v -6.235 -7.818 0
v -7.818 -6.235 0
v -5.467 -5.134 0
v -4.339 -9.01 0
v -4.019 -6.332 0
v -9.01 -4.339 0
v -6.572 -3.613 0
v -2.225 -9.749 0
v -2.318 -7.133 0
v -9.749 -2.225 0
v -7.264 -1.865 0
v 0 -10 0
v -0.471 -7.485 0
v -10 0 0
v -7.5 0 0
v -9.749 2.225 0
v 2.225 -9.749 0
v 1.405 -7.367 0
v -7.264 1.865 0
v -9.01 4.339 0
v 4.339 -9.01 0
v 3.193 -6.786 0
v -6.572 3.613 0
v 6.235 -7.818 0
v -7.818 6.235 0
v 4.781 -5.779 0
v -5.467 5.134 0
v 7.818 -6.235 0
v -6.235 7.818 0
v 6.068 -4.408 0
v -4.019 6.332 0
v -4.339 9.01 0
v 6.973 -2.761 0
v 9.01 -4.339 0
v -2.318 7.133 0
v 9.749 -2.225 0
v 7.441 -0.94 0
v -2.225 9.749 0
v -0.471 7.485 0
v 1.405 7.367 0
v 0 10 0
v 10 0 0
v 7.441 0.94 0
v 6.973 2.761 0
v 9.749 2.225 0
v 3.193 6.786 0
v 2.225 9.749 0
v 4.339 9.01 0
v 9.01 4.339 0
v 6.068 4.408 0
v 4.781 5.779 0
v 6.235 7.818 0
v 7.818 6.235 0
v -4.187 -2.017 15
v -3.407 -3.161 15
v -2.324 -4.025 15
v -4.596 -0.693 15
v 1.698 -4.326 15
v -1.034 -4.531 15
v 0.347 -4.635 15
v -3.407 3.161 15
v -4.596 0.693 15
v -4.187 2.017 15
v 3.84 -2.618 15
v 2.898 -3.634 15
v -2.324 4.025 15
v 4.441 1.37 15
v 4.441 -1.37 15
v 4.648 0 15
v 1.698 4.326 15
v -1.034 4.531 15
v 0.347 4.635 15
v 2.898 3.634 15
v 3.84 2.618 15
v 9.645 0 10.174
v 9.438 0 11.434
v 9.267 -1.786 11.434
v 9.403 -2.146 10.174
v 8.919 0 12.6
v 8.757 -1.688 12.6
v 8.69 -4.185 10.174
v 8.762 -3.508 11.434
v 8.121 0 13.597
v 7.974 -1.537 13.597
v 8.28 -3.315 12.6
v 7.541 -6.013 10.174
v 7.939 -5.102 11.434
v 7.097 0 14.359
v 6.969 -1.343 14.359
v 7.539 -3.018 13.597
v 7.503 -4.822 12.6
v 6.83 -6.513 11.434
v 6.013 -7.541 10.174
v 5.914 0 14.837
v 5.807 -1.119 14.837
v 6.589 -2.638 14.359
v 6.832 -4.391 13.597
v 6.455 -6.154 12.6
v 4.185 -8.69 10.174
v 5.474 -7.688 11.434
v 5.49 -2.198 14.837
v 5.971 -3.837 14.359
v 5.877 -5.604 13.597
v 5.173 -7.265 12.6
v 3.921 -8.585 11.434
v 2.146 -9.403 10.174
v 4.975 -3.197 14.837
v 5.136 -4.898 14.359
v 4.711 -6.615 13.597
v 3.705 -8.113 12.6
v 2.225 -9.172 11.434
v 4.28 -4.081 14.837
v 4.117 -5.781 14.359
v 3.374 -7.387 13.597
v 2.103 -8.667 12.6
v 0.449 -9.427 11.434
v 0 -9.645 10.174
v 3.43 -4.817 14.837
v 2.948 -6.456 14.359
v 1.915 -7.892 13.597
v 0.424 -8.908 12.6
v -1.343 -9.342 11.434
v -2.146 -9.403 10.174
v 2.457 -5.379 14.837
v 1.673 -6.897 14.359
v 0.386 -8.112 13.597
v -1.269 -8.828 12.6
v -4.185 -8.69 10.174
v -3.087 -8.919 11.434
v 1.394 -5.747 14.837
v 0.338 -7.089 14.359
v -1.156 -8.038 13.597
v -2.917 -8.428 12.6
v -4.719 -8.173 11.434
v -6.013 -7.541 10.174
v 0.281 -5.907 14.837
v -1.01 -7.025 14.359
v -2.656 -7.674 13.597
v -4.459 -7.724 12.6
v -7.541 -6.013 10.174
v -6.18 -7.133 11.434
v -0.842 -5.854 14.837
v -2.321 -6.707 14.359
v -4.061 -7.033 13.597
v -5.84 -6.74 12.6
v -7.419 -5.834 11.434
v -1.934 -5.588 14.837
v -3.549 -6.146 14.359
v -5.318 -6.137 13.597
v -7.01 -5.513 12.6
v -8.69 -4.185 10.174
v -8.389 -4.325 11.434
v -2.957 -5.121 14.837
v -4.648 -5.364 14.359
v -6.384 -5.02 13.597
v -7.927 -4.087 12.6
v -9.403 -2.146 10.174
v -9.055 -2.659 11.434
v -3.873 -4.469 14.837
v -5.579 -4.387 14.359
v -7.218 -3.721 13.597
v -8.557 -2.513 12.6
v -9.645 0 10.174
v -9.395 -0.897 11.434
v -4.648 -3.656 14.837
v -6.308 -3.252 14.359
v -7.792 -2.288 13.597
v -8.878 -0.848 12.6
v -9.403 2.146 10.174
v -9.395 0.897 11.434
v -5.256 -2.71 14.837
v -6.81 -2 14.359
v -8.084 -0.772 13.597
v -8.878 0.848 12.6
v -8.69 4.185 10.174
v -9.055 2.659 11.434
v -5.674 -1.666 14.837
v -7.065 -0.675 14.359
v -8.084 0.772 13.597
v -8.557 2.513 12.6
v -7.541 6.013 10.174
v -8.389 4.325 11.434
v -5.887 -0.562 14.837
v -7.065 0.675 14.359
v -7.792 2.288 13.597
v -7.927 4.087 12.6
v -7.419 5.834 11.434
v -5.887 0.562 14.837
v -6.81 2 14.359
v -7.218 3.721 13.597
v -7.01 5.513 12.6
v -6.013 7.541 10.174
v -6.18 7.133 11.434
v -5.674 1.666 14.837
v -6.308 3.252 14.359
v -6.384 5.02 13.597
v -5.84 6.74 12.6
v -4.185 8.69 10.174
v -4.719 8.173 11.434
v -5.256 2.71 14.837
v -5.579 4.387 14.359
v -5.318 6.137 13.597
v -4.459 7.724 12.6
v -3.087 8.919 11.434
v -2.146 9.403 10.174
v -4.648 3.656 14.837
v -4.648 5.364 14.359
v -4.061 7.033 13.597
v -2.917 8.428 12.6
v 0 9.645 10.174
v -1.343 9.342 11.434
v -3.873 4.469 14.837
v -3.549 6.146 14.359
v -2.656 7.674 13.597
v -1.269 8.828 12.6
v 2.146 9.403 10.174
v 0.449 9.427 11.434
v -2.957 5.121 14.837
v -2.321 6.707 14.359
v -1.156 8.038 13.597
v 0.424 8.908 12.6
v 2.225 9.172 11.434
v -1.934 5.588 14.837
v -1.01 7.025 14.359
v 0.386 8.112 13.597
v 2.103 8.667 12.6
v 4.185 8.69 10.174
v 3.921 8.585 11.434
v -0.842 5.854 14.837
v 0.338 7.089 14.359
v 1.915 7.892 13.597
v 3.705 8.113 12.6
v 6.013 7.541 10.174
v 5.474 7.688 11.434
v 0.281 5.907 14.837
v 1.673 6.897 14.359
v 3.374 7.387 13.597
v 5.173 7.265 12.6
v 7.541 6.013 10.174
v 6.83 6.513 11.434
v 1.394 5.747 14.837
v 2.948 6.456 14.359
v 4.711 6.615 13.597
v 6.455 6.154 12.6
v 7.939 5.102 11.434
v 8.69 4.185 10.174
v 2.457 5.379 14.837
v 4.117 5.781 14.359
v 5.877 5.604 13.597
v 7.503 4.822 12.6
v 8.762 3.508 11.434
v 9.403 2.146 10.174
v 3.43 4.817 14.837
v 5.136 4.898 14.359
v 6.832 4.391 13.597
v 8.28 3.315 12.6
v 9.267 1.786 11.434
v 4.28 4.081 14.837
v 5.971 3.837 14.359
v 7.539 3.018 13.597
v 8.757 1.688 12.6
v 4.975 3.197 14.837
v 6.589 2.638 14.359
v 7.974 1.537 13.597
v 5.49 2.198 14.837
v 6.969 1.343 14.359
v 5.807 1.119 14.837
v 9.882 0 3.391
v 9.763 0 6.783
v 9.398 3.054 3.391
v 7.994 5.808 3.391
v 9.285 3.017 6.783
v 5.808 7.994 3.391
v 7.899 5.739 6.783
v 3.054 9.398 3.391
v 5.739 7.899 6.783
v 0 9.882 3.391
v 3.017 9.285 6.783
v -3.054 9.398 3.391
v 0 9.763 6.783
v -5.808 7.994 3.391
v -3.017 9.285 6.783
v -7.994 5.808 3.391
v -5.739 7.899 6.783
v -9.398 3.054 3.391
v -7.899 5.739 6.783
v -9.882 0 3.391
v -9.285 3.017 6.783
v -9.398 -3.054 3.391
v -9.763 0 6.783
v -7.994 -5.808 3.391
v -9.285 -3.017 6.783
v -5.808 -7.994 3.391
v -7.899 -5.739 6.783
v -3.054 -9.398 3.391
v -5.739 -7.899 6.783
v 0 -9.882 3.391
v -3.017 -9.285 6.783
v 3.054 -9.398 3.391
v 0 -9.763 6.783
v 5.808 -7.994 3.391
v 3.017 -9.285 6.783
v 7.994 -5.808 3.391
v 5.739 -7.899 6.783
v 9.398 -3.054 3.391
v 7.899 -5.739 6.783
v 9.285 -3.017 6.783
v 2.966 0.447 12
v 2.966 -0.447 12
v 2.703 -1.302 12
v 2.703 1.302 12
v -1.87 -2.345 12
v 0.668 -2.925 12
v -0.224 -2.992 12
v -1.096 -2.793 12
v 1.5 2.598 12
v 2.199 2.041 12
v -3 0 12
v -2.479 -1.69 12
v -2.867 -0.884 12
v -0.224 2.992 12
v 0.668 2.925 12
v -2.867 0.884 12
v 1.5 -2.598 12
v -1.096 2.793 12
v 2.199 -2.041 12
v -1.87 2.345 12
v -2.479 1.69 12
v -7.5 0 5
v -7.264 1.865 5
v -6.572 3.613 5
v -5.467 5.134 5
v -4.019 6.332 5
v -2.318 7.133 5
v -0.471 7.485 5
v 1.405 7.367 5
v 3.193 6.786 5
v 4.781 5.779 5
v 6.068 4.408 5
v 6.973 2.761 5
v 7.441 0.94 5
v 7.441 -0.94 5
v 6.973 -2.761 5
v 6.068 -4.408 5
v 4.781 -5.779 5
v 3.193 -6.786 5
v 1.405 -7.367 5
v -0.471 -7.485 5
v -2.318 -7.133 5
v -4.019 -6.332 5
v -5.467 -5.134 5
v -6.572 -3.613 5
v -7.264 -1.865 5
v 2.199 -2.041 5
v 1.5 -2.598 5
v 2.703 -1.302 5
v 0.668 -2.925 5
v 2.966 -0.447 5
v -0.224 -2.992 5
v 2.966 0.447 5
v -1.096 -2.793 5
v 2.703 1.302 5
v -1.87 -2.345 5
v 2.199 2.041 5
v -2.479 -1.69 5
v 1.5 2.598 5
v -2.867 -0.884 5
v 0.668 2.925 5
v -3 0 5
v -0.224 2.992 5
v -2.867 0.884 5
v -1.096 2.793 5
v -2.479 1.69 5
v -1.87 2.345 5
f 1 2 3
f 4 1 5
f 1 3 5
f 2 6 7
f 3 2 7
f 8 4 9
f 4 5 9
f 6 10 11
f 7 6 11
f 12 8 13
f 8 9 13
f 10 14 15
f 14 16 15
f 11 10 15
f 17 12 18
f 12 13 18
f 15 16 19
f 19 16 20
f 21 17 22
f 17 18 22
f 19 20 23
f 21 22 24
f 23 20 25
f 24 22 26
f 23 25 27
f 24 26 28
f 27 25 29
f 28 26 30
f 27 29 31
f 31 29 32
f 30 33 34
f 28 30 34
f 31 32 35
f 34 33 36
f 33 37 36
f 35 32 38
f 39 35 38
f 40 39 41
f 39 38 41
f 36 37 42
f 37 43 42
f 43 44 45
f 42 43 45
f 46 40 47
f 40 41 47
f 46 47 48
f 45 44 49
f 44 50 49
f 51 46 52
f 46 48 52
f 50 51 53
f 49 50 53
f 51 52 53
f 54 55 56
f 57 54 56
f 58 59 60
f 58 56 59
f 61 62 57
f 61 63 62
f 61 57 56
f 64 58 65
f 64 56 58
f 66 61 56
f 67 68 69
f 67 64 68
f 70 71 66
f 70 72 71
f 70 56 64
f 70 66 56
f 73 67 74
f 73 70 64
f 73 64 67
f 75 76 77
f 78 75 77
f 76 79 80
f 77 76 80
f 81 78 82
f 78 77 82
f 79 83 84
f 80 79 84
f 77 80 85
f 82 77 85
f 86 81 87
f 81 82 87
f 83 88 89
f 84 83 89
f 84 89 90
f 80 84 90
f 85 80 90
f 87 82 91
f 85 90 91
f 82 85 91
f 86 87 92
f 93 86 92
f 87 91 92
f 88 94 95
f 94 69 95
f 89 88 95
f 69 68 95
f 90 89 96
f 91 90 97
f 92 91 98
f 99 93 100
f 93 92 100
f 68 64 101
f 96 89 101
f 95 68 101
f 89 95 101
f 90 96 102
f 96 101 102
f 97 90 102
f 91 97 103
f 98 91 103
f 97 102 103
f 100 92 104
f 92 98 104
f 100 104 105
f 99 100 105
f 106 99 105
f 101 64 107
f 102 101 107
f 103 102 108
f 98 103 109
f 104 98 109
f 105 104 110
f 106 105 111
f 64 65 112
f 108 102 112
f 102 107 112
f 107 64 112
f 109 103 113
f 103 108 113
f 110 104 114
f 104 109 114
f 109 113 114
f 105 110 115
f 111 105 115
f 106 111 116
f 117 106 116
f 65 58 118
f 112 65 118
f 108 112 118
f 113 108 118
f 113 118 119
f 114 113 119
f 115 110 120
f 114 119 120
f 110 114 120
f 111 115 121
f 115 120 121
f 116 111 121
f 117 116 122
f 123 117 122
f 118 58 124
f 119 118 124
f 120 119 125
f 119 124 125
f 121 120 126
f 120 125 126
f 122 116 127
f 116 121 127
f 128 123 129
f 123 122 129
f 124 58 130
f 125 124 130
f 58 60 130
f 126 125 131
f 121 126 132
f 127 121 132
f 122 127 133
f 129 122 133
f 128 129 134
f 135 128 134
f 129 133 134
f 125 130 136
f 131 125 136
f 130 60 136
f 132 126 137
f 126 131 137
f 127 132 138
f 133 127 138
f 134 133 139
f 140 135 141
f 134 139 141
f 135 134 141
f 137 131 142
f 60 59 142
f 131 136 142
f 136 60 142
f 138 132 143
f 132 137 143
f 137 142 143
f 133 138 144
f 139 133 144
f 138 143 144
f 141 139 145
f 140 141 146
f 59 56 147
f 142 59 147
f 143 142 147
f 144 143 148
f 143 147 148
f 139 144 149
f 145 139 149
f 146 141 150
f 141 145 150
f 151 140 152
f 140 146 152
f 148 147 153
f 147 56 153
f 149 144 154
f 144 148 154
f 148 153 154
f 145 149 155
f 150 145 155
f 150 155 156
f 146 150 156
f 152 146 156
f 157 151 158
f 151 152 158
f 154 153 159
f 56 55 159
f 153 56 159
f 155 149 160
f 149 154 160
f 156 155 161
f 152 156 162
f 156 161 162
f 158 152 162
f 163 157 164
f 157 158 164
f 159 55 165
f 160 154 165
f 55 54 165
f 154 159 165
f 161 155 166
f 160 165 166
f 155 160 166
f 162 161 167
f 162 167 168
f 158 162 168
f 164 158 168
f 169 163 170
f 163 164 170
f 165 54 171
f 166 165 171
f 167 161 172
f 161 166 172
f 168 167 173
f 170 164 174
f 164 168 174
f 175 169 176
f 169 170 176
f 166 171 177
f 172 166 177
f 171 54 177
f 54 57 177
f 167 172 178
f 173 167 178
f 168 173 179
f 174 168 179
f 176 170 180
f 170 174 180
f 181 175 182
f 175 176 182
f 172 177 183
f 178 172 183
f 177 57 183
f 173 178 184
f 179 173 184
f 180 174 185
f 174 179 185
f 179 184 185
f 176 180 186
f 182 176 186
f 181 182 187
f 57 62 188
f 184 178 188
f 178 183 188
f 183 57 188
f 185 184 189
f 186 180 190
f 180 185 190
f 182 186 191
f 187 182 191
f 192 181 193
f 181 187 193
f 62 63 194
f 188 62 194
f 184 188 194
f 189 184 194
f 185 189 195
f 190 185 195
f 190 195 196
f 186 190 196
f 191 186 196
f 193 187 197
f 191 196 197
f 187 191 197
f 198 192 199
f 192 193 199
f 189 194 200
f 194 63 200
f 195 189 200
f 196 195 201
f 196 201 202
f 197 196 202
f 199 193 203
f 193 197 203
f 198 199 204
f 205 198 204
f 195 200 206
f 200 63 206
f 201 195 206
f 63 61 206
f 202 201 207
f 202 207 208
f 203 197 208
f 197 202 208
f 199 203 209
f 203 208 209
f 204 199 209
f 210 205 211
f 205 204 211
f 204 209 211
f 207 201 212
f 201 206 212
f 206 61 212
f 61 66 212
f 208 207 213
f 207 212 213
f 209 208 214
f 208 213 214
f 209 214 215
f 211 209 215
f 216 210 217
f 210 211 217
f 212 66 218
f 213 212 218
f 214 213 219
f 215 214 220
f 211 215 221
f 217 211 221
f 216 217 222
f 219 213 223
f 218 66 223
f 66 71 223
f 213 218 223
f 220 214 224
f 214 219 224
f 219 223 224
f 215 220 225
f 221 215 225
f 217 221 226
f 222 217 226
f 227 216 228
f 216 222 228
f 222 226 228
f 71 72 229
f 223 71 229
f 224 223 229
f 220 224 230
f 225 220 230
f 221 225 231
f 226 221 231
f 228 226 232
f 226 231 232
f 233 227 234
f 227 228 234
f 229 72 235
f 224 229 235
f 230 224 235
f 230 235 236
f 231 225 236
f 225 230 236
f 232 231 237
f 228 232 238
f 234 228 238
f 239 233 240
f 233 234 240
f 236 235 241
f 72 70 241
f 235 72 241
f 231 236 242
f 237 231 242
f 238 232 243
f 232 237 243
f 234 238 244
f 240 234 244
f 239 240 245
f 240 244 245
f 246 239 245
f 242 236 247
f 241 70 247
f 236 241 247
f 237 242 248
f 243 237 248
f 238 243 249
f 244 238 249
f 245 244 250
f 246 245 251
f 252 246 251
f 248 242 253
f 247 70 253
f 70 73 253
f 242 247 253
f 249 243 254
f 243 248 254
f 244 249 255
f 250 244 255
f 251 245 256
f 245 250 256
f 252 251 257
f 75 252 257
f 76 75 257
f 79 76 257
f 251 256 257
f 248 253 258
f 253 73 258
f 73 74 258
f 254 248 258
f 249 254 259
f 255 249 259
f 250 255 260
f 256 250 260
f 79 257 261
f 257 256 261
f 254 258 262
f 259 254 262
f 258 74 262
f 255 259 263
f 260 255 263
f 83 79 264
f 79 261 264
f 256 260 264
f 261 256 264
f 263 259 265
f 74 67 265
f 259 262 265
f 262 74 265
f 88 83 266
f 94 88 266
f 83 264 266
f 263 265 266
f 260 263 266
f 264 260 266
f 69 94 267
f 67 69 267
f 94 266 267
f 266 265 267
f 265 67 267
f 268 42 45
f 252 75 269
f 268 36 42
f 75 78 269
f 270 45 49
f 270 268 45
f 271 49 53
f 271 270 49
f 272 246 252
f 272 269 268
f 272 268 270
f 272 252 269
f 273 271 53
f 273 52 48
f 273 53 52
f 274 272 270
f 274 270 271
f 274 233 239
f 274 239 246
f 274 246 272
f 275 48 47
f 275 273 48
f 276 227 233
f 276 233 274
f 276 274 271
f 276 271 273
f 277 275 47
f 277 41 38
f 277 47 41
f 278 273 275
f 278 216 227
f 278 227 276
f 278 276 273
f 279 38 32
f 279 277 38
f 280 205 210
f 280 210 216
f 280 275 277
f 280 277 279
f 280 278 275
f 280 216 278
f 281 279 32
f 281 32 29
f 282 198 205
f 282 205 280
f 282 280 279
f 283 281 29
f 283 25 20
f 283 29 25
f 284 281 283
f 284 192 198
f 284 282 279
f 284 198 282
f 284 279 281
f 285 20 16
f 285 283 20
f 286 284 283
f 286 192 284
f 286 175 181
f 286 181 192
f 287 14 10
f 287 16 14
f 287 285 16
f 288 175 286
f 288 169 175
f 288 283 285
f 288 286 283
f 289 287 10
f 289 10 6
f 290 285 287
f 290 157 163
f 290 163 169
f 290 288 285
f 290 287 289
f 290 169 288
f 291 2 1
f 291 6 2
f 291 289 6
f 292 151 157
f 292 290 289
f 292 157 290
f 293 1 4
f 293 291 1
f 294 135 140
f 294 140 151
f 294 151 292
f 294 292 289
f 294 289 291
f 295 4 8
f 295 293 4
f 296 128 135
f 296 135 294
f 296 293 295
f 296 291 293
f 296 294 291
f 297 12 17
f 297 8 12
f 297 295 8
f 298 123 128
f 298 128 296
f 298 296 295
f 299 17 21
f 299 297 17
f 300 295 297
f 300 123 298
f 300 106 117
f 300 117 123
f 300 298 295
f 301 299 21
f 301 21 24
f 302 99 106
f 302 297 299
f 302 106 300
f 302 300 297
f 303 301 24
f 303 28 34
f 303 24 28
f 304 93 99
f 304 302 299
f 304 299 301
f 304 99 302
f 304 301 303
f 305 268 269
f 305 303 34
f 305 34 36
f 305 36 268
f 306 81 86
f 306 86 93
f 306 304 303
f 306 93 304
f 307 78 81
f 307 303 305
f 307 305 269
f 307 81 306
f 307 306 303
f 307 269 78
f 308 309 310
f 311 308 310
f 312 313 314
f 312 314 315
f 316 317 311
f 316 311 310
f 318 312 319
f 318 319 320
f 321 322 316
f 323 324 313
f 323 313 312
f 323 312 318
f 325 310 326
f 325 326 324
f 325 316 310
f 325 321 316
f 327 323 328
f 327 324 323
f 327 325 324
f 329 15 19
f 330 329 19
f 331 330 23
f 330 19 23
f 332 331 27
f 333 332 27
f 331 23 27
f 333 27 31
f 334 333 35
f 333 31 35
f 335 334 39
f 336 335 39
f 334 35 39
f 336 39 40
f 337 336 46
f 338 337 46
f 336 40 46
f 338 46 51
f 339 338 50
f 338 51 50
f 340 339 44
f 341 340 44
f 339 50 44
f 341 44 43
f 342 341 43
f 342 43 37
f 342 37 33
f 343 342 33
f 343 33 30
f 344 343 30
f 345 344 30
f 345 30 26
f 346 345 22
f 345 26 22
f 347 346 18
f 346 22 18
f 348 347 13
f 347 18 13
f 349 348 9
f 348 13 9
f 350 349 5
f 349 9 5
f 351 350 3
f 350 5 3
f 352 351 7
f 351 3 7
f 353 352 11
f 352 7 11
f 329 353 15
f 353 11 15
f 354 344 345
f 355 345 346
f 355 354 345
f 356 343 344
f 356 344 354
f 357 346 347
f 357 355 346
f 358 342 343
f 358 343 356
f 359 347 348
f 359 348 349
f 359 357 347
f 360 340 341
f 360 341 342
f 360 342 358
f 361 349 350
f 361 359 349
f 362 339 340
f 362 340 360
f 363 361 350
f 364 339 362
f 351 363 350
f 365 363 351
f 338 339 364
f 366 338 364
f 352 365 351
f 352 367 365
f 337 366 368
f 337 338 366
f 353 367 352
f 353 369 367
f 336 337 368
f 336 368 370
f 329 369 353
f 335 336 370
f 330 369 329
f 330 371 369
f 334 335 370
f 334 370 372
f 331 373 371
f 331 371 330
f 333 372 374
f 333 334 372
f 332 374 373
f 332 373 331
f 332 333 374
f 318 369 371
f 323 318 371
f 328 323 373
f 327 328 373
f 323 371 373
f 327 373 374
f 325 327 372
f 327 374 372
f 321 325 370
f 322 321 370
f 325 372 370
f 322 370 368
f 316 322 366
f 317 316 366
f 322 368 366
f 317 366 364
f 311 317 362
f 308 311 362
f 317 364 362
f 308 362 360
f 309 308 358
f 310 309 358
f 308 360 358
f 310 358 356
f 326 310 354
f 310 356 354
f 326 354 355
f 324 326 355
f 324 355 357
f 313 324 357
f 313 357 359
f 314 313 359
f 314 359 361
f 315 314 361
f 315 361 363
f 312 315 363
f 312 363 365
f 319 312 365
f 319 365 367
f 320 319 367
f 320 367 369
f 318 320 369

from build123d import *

# Parameters (mm, degrees)
ESQUISSE1_R             = 10
BOSS_EXTRU_1_DEPTH      = 15
BOSS_EXTRU_1_TAPER      = 2
CONG_1_R                = 5
ESQUISSE2_R             = 3
ENL_V_MAT_EXTRU_1_DEPTH = 12
ESQUISSE3_R             = 7.5
ENL_V_MAT_EXTRU_2_DEPTH = 5


with BuildPart() as part:
    # Esquisse1 → Boss.-Extru.1 (new body)
    with BuildSketch(Plane.XY):
        Circle(ESQUISSE1_R)
    extrude(amount=BOSS_EXTRU_1_DEPTH, taper=BOSS_EXTRU_1_TAPER)

    # Congé1
    cong_1_edges = [part.edges().sort_by_distance(p)[0] for p in [
        (-9.476188458, 0, 15),
    ]]
    fillet(cong_1_edges, radius=CONG_1_R)

    # Esquisse2 → Enlèv. mat.-Extru.1 (cut)
    with BuildSketch(Plane(origin=(0, 0, 0), x_dir=(-1, 0, 0), z_dir=(0, 0, -1))):
        Circle(ESQUISSE2_R)
    extrude(amount=-ENL_V_MAT_EXTRU_1_DEPTH, mode=Mode.SUBTRACT)

    # Esquisse3 → Enlèv. mat.-Extru.2 (cut)
    with BuildSketch(Plane(origin=(0, 0, 0), x_dir=(-1, 0, 0), z_dir=(0, 0, -1))):
        Circle(ESQUISSE3_R)
    extrude(amount=-ENL_V_MAT_EXTRU_2_DEPTH, mode=Mode.SUBTRACT)


solid = part.part
